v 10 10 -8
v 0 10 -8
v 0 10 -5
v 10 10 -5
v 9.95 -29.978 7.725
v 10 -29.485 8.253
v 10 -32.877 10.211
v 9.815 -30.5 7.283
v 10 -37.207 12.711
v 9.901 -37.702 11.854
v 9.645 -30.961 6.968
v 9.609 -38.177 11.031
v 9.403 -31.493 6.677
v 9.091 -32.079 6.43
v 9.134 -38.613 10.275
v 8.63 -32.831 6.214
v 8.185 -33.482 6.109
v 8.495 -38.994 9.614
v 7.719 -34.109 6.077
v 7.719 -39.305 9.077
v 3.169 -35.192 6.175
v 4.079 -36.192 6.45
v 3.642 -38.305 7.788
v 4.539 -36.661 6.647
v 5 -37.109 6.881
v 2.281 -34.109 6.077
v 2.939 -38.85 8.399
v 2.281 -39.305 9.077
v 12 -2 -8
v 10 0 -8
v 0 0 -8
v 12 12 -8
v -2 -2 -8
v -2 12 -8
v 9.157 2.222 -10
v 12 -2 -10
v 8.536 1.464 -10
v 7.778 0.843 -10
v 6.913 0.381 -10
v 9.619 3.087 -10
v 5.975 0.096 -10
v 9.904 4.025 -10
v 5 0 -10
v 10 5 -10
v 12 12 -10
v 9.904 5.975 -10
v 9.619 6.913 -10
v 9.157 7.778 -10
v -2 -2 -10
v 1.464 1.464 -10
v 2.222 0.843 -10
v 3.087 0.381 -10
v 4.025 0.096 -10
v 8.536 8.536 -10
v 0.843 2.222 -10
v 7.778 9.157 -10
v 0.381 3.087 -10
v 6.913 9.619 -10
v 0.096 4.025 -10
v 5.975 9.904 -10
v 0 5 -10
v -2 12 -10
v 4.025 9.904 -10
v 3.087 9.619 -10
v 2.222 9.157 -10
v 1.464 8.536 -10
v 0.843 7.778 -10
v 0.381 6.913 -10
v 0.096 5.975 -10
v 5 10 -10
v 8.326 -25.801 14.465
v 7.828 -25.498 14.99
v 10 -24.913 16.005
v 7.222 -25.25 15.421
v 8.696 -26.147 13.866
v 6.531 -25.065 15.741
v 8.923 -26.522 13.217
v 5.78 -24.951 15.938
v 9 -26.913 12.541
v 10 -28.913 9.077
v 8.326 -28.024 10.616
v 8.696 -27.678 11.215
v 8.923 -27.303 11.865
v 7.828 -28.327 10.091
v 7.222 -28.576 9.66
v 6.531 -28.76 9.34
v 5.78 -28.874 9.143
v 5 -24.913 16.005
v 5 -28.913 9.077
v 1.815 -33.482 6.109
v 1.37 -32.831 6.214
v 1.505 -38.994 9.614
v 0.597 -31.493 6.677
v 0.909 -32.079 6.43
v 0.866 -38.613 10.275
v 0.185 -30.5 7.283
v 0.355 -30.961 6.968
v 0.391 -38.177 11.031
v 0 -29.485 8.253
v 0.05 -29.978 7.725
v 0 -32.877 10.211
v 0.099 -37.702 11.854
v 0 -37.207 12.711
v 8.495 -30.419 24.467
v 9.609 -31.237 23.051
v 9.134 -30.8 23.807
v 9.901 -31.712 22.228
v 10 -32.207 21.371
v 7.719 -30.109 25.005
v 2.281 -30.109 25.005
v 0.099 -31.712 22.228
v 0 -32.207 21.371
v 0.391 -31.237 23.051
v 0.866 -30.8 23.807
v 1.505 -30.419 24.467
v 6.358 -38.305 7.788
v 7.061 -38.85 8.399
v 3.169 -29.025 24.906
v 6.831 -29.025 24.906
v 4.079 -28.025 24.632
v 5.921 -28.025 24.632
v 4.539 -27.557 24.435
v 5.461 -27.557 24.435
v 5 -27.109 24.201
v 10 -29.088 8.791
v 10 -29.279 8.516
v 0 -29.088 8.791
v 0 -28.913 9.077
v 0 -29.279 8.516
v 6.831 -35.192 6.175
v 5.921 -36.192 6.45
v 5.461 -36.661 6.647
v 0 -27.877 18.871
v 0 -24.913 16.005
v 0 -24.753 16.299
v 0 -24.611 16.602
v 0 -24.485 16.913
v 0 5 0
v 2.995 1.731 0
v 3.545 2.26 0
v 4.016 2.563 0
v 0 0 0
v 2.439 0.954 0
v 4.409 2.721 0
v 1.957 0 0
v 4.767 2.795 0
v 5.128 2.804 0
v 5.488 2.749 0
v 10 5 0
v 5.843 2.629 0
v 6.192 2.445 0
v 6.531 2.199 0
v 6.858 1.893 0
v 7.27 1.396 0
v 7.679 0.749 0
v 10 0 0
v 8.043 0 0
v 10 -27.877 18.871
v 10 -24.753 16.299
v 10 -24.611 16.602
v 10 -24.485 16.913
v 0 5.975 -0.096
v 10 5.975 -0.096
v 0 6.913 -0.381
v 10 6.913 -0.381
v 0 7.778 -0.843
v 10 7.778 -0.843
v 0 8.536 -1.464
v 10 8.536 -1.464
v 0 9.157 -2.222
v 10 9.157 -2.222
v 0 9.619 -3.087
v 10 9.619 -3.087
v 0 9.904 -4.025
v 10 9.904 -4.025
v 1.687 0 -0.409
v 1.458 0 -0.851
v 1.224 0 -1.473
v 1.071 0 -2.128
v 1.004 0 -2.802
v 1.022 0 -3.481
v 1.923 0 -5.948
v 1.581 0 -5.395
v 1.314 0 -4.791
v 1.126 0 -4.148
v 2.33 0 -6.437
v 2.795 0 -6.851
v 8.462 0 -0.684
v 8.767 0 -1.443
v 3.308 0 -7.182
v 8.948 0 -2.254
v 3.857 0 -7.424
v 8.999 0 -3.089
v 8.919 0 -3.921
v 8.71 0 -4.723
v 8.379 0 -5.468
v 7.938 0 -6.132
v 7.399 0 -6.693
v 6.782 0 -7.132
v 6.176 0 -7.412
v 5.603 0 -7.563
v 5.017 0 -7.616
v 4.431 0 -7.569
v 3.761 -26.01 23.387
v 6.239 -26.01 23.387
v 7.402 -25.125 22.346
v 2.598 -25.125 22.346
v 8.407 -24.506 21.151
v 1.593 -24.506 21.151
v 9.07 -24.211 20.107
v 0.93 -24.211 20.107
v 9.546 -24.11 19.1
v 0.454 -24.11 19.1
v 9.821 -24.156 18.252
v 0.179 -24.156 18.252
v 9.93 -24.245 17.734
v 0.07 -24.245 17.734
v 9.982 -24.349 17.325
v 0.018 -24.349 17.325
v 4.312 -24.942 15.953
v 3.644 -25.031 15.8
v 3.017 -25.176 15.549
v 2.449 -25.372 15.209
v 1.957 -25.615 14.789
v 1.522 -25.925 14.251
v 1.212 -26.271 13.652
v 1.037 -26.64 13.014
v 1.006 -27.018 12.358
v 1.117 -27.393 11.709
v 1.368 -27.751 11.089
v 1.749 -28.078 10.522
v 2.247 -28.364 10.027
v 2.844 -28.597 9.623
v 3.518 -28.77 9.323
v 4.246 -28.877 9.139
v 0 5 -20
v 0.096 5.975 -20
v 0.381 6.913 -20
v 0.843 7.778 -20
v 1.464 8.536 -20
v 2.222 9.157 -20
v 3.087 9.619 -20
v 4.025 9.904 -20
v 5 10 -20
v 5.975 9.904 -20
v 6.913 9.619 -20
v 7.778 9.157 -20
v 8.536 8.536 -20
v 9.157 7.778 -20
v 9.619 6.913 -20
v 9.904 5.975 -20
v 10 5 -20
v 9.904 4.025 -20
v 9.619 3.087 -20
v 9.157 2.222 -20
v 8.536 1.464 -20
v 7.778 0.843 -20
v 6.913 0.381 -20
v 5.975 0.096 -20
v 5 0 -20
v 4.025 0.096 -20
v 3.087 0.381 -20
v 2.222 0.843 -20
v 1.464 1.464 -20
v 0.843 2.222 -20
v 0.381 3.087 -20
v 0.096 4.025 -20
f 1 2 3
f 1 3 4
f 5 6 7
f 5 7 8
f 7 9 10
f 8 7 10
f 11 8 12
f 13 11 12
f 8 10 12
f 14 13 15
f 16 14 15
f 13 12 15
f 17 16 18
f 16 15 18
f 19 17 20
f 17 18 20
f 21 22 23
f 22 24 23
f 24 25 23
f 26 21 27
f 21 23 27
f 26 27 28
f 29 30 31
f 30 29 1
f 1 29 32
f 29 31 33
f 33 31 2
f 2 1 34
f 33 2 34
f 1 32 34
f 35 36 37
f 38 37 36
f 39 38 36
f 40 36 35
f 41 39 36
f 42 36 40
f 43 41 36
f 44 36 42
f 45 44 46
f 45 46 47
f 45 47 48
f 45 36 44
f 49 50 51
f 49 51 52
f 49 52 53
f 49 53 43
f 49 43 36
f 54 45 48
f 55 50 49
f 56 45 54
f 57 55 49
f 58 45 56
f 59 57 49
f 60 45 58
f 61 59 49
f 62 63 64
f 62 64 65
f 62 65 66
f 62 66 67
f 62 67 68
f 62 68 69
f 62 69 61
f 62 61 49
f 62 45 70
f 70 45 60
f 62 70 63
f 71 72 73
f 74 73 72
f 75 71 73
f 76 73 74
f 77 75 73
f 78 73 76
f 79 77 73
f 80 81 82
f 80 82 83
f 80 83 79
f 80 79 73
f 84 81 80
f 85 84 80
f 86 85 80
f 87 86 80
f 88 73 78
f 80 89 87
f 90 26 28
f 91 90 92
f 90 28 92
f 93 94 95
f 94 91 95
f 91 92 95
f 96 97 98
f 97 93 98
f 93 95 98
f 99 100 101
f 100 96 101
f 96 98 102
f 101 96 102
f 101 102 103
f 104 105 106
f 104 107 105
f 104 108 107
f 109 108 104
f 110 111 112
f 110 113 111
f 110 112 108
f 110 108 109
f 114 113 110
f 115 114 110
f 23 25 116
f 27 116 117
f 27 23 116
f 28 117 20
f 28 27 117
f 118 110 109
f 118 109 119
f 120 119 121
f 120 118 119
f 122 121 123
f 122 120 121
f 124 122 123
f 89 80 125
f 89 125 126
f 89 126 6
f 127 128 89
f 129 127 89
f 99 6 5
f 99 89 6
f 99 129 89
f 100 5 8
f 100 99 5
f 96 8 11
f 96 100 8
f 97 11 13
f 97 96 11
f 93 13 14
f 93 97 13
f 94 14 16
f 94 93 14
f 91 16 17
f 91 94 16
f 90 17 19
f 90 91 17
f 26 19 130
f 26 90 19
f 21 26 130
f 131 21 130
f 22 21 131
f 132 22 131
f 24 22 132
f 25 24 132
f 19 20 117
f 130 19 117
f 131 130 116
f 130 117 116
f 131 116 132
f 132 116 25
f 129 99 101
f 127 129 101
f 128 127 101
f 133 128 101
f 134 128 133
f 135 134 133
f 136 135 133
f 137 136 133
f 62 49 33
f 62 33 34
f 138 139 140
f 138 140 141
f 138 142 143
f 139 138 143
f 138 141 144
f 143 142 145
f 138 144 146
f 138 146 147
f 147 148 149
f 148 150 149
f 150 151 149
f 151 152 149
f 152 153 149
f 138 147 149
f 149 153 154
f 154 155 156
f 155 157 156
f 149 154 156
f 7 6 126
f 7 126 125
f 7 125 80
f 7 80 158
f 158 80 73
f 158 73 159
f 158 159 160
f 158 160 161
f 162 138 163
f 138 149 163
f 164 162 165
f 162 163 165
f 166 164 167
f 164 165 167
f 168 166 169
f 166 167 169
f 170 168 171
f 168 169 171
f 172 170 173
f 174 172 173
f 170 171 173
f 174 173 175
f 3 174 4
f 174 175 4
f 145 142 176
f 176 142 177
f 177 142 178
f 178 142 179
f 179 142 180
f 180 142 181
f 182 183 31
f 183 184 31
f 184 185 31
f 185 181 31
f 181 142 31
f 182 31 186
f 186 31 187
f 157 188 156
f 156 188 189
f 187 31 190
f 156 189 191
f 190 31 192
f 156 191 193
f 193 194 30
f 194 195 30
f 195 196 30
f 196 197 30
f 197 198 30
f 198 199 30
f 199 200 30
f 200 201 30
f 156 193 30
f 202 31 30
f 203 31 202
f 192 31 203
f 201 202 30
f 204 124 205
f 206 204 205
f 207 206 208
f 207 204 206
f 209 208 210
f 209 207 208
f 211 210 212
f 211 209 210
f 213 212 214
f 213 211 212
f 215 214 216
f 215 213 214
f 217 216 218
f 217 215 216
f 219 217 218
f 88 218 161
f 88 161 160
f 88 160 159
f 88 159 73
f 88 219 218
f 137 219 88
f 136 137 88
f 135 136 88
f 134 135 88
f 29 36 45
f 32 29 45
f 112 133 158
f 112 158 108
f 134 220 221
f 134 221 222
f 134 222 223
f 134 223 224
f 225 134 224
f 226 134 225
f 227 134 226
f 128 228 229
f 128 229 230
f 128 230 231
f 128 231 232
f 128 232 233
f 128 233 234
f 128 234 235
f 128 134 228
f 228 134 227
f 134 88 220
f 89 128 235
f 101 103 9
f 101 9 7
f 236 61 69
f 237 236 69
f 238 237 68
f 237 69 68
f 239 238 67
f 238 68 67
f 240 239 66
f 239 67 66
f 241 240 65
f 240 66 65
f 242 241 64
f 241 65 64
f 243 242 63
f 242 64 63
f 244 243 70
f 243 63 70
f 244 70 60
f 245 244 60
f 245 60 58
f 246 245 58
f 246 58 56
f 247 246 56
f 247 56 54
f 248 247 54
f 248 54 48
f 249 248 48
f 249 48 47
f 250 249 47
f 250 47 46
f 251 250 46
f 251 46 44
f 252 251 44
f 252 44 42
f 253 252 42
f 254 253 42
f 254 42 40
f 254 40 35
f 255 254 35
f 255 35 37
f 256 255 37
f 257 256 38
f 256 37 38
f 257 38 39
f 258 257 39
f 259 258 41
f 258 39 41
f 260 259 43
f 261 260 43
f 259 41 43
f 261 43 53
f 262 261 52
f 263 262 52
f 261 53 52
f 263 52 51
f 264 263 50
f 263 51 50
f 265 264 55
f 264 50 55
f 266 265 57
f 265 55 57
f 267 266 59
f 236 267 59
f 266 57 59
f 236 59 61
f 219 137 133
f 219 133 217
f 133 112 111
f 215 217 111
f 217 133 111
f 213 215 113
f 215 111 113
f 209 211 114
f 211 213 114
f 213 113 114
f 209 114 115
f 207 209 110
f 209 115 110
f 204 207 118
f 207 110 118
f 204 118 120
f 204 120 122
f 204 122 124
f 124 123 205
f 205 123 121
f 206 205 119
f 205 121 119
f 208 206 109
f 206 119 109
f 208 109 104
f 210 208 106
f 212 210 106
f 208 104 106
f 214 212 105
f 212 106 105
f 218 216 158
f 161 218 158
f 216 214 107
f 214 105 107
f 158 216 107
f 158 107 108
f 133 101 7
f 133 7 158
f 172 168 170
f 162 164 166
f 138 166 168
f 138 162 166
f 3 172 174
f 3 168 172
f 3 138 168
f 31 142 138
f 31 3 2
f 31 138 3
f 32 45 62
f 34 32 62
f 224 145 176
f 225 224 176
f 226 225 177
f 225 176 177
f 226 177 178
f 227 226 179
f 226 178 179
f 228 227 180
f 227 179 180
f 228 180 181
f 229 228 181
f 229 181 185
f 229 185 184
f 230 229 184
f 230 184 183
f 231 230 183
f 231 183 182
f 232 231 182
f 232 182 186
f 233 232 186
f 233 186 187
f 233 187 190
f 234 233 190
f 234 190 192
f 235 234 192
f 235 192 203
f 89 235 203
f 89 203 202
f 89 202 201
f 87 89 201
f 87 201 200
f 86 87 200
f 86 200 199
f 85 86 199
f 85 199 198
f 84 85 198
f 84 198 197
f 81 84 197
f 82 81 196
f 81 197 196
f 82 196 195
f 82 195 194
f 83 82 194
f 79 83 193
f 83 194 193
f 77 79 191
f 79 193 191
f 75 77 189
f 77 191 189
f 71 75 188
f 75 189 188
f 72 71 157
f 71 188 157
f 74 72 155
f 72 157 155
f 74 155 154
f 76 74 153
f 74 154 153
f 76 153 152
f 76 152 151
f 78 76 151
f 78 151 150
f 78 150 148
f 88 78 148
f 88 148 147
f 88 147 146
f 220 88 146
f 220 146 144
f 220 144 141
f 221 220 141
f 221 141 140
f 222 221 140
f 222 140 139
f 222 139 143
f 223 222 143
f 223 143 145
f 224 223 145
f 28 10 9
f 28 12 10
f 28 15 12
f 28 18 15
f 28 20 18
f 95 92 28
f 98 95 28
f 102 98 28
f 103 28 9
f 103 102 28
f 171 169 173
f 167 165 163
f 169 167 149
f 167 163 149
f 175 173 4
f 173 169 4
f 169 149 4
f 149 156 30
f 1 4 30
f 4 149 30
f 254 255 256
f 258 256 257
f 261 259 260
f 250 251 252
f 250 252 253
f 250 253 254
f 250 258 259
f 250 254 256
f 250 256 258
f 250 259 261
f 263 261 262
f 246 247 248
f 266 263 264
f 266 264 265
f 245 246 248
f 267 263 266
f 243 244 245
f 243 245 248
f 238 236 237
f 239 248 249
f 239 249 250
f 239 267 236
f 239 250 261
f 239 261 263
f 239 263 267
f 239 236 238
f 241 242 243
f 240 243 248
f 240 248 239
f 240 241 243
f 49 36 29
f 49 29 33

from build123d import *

# Parameters (mm, degrees)
SKETCH1_W           = 10
SKETCH1_H           = 10
BOSS_EXTRUDE1_DEPTH = 10
SKETCH2_R           = 5
BOSS_EXTRUDE2_DEPTH = 10
SKETCH4_R           = 4
BOSS_EXTRUDE3_DEPTH = 40
BOSS_EXTRUDE4_DEPTH = 10
CUT_EXTRUDE1_DEPTH  = 10
FILLET2_R           = 5
SKETCH7_W           = 14
SKETCH7_H           = 14
BOSS_EXTRUDE5_DEPTH = 2


with BuildPart() as part:
    # Sketch1 → Boss-Extrude1 (new body)
    with BuildSketch(Plane(origin=(0, 0, 0), x_dir=(1, 0, 0), z_dir=(0, 1, 0))):
        with Locations((5, 5)):
            Rectangle(SKETCH1_W, SKETCH1_H)
    extrude(amount=BOSS_EXTRUDE1_DEPTH)

    # Sketch2 → Boss-Extrude2 (add)
    with BuildSketch(Plane(origin=(0, 0, -10), x_dir=(-1, 0, 0), z_dir=(0, 0, -1))):
        with Locations((-5, 5)):
            Circle(SKETCH2_R)
    extrude(amount=BOSS_EXTRUDE2_DEPTH)

    # Sketch4 → Boss-Extrude3 (add)
    with BuildSketch(Plane(origin=(9.62e-07, 9.026239035, -5.211301537), x_dir=(0, -0.49999999999999467, -0.8660254037844417), z_dir=(-9.225892847871432e-08, -0.8660254037844382, 0.4999999999999926))):
        with Locations(Location((2.59569937, 4.999999038, 0), (0, 0, 229.539411428))):
            Circle(SKETCH4_R)
    extrude(amount=BOSS_EXTRUDE3_DEPTH)

    # Sketch5 → Boss-Extrude4 (add)
    with BuildSketch(Plane(origin=(0, 0, 0), x_dir=(0, 0, -1), z_dir=(1, 0, 0))):
        with BuildLine():
            Line((-16.004858714, -24.912627201), (-9.076655484, -28.912627201))
            ThreePointArc((-9.076655484, -28.912627201), (-6.076655484, -34.108779624), (-9.076655484, -39.304932046))
            Line((-9.076655484, -39.304932046), (-12.71063008, -37.206855835))
            Line((-12.71063008, -37.206855835), (-10.21063008, -32.876728816))
            Line((-10.21063008, -32.876728816), (-18.870884118, -27.876728816))
            Line((-18.870884118, -27.876728816), (-21.370884118, -32.206855835))
            Line((-21.370884118, -32.206855835), (-25.004858714, -30.108779624))
            ThreePointArc((-25.004858714, -30.108779624), (-22.004858714, -24.912627201), (-16.004858714, -24.912627201))
        make_face()
    extrude(amount=BOSS_EXTRUDE4_DEPTH)

    # Sketch6 → Cut-Extrude1 (cut)
    with BuildSketch(Plane(origin=(0, -33.40900615, 19.288698694), x_dir=(-1, 0, 0), z_dir=(0, -0.8660254037844403, 0.4999999999999971))):
        with BuildLine():
            Line((0, -7.40430063), (0, -2.40430063))
            ThreePointArc((0, -2.40430063), (-1.464466094, -5.939834536), (-5, -7.40430063))
            Line((-5, -7.40430063), (0, -7.40430063))
        make_face()
        with BuildLine():
            Line((-10, -7.40430063), (-5, -7.40430063))
            ThreePointArc((-5, -7.40430063), (-8.535533906, -5.939834536), (-10, -2.40430063))
            Line((-10, -2.40430063), (-10, -7.40430063))
        make_face()
        with BuildLine():
            ThreePointArc((-7.718879336, 11.791851793), (-6.417610293, 12.390527944), (-5, 12.59569937))
            Line((-5, 12.59569937), (-10, 12.59569937))
            Line((-10, 12.59569937), (-10, 11.791851793))
            Line((-10, 11.791851793), (-7.718879336, 11.791851793))
        make_face()
        with BuildLine():
            ThreePointArc((-10, 7.59569937), (-9.392857651, 9.983753318), (-7.718879336, 11.791851793))
            Line((-7.718879336, 11.791851793), (-10, 11.791851793))
            Line((-10, 11.791851793), (-10, 7.59569937))
        make_face()
        with BuildLine():
            Line((-2.281120664, 11.791851793), (0, 11.791851793))
            Line((0, 11.791851793), (0, 12.59569937))
            Line((0, 12.59569937), (-5, 12.59569937))
            ThreePointArc((-5, 12.59569937), (-3.582389707, 12.390527944), (-2.281120664, 11.791851793))
        make_face()
        with BuildLine():
            ThreePointArc((-2.281120664, 11.791851793), (-0.607142349, 9.983753318), (0, 7.59569937))
            Line((0, 7.59569937), (0, 11.791851793))
            Line((0, 11.791851793), (-2.281120664, 11.791851793))
        make_face()
    extrude(amount=-CUT_EXTRUDE1_DEPTH, mode=Mode.SUBTRACT)

    # Fillet2
    fillet2_edges = [part.edges().sort_by_distance(p)[0] for p in [
        (5, 10, 0),
    ]]
    fillet(fillet2_edges, radius=FILLET2_R)

    # Sketch7 → Boss-Extrude5 (add)
    with BuildSketch(Plane(origin=(0, 0, -10), x_dir=(-1, 0, 0), z_dir=(0, 0, -1))):
        with Locations((-5, 5)):
            Rectangle(SKETCH7_W, SKETCH7_H)
    extrude(amount=-BOSS_EXTRUDE5_DEPTH)


solid = part.part
